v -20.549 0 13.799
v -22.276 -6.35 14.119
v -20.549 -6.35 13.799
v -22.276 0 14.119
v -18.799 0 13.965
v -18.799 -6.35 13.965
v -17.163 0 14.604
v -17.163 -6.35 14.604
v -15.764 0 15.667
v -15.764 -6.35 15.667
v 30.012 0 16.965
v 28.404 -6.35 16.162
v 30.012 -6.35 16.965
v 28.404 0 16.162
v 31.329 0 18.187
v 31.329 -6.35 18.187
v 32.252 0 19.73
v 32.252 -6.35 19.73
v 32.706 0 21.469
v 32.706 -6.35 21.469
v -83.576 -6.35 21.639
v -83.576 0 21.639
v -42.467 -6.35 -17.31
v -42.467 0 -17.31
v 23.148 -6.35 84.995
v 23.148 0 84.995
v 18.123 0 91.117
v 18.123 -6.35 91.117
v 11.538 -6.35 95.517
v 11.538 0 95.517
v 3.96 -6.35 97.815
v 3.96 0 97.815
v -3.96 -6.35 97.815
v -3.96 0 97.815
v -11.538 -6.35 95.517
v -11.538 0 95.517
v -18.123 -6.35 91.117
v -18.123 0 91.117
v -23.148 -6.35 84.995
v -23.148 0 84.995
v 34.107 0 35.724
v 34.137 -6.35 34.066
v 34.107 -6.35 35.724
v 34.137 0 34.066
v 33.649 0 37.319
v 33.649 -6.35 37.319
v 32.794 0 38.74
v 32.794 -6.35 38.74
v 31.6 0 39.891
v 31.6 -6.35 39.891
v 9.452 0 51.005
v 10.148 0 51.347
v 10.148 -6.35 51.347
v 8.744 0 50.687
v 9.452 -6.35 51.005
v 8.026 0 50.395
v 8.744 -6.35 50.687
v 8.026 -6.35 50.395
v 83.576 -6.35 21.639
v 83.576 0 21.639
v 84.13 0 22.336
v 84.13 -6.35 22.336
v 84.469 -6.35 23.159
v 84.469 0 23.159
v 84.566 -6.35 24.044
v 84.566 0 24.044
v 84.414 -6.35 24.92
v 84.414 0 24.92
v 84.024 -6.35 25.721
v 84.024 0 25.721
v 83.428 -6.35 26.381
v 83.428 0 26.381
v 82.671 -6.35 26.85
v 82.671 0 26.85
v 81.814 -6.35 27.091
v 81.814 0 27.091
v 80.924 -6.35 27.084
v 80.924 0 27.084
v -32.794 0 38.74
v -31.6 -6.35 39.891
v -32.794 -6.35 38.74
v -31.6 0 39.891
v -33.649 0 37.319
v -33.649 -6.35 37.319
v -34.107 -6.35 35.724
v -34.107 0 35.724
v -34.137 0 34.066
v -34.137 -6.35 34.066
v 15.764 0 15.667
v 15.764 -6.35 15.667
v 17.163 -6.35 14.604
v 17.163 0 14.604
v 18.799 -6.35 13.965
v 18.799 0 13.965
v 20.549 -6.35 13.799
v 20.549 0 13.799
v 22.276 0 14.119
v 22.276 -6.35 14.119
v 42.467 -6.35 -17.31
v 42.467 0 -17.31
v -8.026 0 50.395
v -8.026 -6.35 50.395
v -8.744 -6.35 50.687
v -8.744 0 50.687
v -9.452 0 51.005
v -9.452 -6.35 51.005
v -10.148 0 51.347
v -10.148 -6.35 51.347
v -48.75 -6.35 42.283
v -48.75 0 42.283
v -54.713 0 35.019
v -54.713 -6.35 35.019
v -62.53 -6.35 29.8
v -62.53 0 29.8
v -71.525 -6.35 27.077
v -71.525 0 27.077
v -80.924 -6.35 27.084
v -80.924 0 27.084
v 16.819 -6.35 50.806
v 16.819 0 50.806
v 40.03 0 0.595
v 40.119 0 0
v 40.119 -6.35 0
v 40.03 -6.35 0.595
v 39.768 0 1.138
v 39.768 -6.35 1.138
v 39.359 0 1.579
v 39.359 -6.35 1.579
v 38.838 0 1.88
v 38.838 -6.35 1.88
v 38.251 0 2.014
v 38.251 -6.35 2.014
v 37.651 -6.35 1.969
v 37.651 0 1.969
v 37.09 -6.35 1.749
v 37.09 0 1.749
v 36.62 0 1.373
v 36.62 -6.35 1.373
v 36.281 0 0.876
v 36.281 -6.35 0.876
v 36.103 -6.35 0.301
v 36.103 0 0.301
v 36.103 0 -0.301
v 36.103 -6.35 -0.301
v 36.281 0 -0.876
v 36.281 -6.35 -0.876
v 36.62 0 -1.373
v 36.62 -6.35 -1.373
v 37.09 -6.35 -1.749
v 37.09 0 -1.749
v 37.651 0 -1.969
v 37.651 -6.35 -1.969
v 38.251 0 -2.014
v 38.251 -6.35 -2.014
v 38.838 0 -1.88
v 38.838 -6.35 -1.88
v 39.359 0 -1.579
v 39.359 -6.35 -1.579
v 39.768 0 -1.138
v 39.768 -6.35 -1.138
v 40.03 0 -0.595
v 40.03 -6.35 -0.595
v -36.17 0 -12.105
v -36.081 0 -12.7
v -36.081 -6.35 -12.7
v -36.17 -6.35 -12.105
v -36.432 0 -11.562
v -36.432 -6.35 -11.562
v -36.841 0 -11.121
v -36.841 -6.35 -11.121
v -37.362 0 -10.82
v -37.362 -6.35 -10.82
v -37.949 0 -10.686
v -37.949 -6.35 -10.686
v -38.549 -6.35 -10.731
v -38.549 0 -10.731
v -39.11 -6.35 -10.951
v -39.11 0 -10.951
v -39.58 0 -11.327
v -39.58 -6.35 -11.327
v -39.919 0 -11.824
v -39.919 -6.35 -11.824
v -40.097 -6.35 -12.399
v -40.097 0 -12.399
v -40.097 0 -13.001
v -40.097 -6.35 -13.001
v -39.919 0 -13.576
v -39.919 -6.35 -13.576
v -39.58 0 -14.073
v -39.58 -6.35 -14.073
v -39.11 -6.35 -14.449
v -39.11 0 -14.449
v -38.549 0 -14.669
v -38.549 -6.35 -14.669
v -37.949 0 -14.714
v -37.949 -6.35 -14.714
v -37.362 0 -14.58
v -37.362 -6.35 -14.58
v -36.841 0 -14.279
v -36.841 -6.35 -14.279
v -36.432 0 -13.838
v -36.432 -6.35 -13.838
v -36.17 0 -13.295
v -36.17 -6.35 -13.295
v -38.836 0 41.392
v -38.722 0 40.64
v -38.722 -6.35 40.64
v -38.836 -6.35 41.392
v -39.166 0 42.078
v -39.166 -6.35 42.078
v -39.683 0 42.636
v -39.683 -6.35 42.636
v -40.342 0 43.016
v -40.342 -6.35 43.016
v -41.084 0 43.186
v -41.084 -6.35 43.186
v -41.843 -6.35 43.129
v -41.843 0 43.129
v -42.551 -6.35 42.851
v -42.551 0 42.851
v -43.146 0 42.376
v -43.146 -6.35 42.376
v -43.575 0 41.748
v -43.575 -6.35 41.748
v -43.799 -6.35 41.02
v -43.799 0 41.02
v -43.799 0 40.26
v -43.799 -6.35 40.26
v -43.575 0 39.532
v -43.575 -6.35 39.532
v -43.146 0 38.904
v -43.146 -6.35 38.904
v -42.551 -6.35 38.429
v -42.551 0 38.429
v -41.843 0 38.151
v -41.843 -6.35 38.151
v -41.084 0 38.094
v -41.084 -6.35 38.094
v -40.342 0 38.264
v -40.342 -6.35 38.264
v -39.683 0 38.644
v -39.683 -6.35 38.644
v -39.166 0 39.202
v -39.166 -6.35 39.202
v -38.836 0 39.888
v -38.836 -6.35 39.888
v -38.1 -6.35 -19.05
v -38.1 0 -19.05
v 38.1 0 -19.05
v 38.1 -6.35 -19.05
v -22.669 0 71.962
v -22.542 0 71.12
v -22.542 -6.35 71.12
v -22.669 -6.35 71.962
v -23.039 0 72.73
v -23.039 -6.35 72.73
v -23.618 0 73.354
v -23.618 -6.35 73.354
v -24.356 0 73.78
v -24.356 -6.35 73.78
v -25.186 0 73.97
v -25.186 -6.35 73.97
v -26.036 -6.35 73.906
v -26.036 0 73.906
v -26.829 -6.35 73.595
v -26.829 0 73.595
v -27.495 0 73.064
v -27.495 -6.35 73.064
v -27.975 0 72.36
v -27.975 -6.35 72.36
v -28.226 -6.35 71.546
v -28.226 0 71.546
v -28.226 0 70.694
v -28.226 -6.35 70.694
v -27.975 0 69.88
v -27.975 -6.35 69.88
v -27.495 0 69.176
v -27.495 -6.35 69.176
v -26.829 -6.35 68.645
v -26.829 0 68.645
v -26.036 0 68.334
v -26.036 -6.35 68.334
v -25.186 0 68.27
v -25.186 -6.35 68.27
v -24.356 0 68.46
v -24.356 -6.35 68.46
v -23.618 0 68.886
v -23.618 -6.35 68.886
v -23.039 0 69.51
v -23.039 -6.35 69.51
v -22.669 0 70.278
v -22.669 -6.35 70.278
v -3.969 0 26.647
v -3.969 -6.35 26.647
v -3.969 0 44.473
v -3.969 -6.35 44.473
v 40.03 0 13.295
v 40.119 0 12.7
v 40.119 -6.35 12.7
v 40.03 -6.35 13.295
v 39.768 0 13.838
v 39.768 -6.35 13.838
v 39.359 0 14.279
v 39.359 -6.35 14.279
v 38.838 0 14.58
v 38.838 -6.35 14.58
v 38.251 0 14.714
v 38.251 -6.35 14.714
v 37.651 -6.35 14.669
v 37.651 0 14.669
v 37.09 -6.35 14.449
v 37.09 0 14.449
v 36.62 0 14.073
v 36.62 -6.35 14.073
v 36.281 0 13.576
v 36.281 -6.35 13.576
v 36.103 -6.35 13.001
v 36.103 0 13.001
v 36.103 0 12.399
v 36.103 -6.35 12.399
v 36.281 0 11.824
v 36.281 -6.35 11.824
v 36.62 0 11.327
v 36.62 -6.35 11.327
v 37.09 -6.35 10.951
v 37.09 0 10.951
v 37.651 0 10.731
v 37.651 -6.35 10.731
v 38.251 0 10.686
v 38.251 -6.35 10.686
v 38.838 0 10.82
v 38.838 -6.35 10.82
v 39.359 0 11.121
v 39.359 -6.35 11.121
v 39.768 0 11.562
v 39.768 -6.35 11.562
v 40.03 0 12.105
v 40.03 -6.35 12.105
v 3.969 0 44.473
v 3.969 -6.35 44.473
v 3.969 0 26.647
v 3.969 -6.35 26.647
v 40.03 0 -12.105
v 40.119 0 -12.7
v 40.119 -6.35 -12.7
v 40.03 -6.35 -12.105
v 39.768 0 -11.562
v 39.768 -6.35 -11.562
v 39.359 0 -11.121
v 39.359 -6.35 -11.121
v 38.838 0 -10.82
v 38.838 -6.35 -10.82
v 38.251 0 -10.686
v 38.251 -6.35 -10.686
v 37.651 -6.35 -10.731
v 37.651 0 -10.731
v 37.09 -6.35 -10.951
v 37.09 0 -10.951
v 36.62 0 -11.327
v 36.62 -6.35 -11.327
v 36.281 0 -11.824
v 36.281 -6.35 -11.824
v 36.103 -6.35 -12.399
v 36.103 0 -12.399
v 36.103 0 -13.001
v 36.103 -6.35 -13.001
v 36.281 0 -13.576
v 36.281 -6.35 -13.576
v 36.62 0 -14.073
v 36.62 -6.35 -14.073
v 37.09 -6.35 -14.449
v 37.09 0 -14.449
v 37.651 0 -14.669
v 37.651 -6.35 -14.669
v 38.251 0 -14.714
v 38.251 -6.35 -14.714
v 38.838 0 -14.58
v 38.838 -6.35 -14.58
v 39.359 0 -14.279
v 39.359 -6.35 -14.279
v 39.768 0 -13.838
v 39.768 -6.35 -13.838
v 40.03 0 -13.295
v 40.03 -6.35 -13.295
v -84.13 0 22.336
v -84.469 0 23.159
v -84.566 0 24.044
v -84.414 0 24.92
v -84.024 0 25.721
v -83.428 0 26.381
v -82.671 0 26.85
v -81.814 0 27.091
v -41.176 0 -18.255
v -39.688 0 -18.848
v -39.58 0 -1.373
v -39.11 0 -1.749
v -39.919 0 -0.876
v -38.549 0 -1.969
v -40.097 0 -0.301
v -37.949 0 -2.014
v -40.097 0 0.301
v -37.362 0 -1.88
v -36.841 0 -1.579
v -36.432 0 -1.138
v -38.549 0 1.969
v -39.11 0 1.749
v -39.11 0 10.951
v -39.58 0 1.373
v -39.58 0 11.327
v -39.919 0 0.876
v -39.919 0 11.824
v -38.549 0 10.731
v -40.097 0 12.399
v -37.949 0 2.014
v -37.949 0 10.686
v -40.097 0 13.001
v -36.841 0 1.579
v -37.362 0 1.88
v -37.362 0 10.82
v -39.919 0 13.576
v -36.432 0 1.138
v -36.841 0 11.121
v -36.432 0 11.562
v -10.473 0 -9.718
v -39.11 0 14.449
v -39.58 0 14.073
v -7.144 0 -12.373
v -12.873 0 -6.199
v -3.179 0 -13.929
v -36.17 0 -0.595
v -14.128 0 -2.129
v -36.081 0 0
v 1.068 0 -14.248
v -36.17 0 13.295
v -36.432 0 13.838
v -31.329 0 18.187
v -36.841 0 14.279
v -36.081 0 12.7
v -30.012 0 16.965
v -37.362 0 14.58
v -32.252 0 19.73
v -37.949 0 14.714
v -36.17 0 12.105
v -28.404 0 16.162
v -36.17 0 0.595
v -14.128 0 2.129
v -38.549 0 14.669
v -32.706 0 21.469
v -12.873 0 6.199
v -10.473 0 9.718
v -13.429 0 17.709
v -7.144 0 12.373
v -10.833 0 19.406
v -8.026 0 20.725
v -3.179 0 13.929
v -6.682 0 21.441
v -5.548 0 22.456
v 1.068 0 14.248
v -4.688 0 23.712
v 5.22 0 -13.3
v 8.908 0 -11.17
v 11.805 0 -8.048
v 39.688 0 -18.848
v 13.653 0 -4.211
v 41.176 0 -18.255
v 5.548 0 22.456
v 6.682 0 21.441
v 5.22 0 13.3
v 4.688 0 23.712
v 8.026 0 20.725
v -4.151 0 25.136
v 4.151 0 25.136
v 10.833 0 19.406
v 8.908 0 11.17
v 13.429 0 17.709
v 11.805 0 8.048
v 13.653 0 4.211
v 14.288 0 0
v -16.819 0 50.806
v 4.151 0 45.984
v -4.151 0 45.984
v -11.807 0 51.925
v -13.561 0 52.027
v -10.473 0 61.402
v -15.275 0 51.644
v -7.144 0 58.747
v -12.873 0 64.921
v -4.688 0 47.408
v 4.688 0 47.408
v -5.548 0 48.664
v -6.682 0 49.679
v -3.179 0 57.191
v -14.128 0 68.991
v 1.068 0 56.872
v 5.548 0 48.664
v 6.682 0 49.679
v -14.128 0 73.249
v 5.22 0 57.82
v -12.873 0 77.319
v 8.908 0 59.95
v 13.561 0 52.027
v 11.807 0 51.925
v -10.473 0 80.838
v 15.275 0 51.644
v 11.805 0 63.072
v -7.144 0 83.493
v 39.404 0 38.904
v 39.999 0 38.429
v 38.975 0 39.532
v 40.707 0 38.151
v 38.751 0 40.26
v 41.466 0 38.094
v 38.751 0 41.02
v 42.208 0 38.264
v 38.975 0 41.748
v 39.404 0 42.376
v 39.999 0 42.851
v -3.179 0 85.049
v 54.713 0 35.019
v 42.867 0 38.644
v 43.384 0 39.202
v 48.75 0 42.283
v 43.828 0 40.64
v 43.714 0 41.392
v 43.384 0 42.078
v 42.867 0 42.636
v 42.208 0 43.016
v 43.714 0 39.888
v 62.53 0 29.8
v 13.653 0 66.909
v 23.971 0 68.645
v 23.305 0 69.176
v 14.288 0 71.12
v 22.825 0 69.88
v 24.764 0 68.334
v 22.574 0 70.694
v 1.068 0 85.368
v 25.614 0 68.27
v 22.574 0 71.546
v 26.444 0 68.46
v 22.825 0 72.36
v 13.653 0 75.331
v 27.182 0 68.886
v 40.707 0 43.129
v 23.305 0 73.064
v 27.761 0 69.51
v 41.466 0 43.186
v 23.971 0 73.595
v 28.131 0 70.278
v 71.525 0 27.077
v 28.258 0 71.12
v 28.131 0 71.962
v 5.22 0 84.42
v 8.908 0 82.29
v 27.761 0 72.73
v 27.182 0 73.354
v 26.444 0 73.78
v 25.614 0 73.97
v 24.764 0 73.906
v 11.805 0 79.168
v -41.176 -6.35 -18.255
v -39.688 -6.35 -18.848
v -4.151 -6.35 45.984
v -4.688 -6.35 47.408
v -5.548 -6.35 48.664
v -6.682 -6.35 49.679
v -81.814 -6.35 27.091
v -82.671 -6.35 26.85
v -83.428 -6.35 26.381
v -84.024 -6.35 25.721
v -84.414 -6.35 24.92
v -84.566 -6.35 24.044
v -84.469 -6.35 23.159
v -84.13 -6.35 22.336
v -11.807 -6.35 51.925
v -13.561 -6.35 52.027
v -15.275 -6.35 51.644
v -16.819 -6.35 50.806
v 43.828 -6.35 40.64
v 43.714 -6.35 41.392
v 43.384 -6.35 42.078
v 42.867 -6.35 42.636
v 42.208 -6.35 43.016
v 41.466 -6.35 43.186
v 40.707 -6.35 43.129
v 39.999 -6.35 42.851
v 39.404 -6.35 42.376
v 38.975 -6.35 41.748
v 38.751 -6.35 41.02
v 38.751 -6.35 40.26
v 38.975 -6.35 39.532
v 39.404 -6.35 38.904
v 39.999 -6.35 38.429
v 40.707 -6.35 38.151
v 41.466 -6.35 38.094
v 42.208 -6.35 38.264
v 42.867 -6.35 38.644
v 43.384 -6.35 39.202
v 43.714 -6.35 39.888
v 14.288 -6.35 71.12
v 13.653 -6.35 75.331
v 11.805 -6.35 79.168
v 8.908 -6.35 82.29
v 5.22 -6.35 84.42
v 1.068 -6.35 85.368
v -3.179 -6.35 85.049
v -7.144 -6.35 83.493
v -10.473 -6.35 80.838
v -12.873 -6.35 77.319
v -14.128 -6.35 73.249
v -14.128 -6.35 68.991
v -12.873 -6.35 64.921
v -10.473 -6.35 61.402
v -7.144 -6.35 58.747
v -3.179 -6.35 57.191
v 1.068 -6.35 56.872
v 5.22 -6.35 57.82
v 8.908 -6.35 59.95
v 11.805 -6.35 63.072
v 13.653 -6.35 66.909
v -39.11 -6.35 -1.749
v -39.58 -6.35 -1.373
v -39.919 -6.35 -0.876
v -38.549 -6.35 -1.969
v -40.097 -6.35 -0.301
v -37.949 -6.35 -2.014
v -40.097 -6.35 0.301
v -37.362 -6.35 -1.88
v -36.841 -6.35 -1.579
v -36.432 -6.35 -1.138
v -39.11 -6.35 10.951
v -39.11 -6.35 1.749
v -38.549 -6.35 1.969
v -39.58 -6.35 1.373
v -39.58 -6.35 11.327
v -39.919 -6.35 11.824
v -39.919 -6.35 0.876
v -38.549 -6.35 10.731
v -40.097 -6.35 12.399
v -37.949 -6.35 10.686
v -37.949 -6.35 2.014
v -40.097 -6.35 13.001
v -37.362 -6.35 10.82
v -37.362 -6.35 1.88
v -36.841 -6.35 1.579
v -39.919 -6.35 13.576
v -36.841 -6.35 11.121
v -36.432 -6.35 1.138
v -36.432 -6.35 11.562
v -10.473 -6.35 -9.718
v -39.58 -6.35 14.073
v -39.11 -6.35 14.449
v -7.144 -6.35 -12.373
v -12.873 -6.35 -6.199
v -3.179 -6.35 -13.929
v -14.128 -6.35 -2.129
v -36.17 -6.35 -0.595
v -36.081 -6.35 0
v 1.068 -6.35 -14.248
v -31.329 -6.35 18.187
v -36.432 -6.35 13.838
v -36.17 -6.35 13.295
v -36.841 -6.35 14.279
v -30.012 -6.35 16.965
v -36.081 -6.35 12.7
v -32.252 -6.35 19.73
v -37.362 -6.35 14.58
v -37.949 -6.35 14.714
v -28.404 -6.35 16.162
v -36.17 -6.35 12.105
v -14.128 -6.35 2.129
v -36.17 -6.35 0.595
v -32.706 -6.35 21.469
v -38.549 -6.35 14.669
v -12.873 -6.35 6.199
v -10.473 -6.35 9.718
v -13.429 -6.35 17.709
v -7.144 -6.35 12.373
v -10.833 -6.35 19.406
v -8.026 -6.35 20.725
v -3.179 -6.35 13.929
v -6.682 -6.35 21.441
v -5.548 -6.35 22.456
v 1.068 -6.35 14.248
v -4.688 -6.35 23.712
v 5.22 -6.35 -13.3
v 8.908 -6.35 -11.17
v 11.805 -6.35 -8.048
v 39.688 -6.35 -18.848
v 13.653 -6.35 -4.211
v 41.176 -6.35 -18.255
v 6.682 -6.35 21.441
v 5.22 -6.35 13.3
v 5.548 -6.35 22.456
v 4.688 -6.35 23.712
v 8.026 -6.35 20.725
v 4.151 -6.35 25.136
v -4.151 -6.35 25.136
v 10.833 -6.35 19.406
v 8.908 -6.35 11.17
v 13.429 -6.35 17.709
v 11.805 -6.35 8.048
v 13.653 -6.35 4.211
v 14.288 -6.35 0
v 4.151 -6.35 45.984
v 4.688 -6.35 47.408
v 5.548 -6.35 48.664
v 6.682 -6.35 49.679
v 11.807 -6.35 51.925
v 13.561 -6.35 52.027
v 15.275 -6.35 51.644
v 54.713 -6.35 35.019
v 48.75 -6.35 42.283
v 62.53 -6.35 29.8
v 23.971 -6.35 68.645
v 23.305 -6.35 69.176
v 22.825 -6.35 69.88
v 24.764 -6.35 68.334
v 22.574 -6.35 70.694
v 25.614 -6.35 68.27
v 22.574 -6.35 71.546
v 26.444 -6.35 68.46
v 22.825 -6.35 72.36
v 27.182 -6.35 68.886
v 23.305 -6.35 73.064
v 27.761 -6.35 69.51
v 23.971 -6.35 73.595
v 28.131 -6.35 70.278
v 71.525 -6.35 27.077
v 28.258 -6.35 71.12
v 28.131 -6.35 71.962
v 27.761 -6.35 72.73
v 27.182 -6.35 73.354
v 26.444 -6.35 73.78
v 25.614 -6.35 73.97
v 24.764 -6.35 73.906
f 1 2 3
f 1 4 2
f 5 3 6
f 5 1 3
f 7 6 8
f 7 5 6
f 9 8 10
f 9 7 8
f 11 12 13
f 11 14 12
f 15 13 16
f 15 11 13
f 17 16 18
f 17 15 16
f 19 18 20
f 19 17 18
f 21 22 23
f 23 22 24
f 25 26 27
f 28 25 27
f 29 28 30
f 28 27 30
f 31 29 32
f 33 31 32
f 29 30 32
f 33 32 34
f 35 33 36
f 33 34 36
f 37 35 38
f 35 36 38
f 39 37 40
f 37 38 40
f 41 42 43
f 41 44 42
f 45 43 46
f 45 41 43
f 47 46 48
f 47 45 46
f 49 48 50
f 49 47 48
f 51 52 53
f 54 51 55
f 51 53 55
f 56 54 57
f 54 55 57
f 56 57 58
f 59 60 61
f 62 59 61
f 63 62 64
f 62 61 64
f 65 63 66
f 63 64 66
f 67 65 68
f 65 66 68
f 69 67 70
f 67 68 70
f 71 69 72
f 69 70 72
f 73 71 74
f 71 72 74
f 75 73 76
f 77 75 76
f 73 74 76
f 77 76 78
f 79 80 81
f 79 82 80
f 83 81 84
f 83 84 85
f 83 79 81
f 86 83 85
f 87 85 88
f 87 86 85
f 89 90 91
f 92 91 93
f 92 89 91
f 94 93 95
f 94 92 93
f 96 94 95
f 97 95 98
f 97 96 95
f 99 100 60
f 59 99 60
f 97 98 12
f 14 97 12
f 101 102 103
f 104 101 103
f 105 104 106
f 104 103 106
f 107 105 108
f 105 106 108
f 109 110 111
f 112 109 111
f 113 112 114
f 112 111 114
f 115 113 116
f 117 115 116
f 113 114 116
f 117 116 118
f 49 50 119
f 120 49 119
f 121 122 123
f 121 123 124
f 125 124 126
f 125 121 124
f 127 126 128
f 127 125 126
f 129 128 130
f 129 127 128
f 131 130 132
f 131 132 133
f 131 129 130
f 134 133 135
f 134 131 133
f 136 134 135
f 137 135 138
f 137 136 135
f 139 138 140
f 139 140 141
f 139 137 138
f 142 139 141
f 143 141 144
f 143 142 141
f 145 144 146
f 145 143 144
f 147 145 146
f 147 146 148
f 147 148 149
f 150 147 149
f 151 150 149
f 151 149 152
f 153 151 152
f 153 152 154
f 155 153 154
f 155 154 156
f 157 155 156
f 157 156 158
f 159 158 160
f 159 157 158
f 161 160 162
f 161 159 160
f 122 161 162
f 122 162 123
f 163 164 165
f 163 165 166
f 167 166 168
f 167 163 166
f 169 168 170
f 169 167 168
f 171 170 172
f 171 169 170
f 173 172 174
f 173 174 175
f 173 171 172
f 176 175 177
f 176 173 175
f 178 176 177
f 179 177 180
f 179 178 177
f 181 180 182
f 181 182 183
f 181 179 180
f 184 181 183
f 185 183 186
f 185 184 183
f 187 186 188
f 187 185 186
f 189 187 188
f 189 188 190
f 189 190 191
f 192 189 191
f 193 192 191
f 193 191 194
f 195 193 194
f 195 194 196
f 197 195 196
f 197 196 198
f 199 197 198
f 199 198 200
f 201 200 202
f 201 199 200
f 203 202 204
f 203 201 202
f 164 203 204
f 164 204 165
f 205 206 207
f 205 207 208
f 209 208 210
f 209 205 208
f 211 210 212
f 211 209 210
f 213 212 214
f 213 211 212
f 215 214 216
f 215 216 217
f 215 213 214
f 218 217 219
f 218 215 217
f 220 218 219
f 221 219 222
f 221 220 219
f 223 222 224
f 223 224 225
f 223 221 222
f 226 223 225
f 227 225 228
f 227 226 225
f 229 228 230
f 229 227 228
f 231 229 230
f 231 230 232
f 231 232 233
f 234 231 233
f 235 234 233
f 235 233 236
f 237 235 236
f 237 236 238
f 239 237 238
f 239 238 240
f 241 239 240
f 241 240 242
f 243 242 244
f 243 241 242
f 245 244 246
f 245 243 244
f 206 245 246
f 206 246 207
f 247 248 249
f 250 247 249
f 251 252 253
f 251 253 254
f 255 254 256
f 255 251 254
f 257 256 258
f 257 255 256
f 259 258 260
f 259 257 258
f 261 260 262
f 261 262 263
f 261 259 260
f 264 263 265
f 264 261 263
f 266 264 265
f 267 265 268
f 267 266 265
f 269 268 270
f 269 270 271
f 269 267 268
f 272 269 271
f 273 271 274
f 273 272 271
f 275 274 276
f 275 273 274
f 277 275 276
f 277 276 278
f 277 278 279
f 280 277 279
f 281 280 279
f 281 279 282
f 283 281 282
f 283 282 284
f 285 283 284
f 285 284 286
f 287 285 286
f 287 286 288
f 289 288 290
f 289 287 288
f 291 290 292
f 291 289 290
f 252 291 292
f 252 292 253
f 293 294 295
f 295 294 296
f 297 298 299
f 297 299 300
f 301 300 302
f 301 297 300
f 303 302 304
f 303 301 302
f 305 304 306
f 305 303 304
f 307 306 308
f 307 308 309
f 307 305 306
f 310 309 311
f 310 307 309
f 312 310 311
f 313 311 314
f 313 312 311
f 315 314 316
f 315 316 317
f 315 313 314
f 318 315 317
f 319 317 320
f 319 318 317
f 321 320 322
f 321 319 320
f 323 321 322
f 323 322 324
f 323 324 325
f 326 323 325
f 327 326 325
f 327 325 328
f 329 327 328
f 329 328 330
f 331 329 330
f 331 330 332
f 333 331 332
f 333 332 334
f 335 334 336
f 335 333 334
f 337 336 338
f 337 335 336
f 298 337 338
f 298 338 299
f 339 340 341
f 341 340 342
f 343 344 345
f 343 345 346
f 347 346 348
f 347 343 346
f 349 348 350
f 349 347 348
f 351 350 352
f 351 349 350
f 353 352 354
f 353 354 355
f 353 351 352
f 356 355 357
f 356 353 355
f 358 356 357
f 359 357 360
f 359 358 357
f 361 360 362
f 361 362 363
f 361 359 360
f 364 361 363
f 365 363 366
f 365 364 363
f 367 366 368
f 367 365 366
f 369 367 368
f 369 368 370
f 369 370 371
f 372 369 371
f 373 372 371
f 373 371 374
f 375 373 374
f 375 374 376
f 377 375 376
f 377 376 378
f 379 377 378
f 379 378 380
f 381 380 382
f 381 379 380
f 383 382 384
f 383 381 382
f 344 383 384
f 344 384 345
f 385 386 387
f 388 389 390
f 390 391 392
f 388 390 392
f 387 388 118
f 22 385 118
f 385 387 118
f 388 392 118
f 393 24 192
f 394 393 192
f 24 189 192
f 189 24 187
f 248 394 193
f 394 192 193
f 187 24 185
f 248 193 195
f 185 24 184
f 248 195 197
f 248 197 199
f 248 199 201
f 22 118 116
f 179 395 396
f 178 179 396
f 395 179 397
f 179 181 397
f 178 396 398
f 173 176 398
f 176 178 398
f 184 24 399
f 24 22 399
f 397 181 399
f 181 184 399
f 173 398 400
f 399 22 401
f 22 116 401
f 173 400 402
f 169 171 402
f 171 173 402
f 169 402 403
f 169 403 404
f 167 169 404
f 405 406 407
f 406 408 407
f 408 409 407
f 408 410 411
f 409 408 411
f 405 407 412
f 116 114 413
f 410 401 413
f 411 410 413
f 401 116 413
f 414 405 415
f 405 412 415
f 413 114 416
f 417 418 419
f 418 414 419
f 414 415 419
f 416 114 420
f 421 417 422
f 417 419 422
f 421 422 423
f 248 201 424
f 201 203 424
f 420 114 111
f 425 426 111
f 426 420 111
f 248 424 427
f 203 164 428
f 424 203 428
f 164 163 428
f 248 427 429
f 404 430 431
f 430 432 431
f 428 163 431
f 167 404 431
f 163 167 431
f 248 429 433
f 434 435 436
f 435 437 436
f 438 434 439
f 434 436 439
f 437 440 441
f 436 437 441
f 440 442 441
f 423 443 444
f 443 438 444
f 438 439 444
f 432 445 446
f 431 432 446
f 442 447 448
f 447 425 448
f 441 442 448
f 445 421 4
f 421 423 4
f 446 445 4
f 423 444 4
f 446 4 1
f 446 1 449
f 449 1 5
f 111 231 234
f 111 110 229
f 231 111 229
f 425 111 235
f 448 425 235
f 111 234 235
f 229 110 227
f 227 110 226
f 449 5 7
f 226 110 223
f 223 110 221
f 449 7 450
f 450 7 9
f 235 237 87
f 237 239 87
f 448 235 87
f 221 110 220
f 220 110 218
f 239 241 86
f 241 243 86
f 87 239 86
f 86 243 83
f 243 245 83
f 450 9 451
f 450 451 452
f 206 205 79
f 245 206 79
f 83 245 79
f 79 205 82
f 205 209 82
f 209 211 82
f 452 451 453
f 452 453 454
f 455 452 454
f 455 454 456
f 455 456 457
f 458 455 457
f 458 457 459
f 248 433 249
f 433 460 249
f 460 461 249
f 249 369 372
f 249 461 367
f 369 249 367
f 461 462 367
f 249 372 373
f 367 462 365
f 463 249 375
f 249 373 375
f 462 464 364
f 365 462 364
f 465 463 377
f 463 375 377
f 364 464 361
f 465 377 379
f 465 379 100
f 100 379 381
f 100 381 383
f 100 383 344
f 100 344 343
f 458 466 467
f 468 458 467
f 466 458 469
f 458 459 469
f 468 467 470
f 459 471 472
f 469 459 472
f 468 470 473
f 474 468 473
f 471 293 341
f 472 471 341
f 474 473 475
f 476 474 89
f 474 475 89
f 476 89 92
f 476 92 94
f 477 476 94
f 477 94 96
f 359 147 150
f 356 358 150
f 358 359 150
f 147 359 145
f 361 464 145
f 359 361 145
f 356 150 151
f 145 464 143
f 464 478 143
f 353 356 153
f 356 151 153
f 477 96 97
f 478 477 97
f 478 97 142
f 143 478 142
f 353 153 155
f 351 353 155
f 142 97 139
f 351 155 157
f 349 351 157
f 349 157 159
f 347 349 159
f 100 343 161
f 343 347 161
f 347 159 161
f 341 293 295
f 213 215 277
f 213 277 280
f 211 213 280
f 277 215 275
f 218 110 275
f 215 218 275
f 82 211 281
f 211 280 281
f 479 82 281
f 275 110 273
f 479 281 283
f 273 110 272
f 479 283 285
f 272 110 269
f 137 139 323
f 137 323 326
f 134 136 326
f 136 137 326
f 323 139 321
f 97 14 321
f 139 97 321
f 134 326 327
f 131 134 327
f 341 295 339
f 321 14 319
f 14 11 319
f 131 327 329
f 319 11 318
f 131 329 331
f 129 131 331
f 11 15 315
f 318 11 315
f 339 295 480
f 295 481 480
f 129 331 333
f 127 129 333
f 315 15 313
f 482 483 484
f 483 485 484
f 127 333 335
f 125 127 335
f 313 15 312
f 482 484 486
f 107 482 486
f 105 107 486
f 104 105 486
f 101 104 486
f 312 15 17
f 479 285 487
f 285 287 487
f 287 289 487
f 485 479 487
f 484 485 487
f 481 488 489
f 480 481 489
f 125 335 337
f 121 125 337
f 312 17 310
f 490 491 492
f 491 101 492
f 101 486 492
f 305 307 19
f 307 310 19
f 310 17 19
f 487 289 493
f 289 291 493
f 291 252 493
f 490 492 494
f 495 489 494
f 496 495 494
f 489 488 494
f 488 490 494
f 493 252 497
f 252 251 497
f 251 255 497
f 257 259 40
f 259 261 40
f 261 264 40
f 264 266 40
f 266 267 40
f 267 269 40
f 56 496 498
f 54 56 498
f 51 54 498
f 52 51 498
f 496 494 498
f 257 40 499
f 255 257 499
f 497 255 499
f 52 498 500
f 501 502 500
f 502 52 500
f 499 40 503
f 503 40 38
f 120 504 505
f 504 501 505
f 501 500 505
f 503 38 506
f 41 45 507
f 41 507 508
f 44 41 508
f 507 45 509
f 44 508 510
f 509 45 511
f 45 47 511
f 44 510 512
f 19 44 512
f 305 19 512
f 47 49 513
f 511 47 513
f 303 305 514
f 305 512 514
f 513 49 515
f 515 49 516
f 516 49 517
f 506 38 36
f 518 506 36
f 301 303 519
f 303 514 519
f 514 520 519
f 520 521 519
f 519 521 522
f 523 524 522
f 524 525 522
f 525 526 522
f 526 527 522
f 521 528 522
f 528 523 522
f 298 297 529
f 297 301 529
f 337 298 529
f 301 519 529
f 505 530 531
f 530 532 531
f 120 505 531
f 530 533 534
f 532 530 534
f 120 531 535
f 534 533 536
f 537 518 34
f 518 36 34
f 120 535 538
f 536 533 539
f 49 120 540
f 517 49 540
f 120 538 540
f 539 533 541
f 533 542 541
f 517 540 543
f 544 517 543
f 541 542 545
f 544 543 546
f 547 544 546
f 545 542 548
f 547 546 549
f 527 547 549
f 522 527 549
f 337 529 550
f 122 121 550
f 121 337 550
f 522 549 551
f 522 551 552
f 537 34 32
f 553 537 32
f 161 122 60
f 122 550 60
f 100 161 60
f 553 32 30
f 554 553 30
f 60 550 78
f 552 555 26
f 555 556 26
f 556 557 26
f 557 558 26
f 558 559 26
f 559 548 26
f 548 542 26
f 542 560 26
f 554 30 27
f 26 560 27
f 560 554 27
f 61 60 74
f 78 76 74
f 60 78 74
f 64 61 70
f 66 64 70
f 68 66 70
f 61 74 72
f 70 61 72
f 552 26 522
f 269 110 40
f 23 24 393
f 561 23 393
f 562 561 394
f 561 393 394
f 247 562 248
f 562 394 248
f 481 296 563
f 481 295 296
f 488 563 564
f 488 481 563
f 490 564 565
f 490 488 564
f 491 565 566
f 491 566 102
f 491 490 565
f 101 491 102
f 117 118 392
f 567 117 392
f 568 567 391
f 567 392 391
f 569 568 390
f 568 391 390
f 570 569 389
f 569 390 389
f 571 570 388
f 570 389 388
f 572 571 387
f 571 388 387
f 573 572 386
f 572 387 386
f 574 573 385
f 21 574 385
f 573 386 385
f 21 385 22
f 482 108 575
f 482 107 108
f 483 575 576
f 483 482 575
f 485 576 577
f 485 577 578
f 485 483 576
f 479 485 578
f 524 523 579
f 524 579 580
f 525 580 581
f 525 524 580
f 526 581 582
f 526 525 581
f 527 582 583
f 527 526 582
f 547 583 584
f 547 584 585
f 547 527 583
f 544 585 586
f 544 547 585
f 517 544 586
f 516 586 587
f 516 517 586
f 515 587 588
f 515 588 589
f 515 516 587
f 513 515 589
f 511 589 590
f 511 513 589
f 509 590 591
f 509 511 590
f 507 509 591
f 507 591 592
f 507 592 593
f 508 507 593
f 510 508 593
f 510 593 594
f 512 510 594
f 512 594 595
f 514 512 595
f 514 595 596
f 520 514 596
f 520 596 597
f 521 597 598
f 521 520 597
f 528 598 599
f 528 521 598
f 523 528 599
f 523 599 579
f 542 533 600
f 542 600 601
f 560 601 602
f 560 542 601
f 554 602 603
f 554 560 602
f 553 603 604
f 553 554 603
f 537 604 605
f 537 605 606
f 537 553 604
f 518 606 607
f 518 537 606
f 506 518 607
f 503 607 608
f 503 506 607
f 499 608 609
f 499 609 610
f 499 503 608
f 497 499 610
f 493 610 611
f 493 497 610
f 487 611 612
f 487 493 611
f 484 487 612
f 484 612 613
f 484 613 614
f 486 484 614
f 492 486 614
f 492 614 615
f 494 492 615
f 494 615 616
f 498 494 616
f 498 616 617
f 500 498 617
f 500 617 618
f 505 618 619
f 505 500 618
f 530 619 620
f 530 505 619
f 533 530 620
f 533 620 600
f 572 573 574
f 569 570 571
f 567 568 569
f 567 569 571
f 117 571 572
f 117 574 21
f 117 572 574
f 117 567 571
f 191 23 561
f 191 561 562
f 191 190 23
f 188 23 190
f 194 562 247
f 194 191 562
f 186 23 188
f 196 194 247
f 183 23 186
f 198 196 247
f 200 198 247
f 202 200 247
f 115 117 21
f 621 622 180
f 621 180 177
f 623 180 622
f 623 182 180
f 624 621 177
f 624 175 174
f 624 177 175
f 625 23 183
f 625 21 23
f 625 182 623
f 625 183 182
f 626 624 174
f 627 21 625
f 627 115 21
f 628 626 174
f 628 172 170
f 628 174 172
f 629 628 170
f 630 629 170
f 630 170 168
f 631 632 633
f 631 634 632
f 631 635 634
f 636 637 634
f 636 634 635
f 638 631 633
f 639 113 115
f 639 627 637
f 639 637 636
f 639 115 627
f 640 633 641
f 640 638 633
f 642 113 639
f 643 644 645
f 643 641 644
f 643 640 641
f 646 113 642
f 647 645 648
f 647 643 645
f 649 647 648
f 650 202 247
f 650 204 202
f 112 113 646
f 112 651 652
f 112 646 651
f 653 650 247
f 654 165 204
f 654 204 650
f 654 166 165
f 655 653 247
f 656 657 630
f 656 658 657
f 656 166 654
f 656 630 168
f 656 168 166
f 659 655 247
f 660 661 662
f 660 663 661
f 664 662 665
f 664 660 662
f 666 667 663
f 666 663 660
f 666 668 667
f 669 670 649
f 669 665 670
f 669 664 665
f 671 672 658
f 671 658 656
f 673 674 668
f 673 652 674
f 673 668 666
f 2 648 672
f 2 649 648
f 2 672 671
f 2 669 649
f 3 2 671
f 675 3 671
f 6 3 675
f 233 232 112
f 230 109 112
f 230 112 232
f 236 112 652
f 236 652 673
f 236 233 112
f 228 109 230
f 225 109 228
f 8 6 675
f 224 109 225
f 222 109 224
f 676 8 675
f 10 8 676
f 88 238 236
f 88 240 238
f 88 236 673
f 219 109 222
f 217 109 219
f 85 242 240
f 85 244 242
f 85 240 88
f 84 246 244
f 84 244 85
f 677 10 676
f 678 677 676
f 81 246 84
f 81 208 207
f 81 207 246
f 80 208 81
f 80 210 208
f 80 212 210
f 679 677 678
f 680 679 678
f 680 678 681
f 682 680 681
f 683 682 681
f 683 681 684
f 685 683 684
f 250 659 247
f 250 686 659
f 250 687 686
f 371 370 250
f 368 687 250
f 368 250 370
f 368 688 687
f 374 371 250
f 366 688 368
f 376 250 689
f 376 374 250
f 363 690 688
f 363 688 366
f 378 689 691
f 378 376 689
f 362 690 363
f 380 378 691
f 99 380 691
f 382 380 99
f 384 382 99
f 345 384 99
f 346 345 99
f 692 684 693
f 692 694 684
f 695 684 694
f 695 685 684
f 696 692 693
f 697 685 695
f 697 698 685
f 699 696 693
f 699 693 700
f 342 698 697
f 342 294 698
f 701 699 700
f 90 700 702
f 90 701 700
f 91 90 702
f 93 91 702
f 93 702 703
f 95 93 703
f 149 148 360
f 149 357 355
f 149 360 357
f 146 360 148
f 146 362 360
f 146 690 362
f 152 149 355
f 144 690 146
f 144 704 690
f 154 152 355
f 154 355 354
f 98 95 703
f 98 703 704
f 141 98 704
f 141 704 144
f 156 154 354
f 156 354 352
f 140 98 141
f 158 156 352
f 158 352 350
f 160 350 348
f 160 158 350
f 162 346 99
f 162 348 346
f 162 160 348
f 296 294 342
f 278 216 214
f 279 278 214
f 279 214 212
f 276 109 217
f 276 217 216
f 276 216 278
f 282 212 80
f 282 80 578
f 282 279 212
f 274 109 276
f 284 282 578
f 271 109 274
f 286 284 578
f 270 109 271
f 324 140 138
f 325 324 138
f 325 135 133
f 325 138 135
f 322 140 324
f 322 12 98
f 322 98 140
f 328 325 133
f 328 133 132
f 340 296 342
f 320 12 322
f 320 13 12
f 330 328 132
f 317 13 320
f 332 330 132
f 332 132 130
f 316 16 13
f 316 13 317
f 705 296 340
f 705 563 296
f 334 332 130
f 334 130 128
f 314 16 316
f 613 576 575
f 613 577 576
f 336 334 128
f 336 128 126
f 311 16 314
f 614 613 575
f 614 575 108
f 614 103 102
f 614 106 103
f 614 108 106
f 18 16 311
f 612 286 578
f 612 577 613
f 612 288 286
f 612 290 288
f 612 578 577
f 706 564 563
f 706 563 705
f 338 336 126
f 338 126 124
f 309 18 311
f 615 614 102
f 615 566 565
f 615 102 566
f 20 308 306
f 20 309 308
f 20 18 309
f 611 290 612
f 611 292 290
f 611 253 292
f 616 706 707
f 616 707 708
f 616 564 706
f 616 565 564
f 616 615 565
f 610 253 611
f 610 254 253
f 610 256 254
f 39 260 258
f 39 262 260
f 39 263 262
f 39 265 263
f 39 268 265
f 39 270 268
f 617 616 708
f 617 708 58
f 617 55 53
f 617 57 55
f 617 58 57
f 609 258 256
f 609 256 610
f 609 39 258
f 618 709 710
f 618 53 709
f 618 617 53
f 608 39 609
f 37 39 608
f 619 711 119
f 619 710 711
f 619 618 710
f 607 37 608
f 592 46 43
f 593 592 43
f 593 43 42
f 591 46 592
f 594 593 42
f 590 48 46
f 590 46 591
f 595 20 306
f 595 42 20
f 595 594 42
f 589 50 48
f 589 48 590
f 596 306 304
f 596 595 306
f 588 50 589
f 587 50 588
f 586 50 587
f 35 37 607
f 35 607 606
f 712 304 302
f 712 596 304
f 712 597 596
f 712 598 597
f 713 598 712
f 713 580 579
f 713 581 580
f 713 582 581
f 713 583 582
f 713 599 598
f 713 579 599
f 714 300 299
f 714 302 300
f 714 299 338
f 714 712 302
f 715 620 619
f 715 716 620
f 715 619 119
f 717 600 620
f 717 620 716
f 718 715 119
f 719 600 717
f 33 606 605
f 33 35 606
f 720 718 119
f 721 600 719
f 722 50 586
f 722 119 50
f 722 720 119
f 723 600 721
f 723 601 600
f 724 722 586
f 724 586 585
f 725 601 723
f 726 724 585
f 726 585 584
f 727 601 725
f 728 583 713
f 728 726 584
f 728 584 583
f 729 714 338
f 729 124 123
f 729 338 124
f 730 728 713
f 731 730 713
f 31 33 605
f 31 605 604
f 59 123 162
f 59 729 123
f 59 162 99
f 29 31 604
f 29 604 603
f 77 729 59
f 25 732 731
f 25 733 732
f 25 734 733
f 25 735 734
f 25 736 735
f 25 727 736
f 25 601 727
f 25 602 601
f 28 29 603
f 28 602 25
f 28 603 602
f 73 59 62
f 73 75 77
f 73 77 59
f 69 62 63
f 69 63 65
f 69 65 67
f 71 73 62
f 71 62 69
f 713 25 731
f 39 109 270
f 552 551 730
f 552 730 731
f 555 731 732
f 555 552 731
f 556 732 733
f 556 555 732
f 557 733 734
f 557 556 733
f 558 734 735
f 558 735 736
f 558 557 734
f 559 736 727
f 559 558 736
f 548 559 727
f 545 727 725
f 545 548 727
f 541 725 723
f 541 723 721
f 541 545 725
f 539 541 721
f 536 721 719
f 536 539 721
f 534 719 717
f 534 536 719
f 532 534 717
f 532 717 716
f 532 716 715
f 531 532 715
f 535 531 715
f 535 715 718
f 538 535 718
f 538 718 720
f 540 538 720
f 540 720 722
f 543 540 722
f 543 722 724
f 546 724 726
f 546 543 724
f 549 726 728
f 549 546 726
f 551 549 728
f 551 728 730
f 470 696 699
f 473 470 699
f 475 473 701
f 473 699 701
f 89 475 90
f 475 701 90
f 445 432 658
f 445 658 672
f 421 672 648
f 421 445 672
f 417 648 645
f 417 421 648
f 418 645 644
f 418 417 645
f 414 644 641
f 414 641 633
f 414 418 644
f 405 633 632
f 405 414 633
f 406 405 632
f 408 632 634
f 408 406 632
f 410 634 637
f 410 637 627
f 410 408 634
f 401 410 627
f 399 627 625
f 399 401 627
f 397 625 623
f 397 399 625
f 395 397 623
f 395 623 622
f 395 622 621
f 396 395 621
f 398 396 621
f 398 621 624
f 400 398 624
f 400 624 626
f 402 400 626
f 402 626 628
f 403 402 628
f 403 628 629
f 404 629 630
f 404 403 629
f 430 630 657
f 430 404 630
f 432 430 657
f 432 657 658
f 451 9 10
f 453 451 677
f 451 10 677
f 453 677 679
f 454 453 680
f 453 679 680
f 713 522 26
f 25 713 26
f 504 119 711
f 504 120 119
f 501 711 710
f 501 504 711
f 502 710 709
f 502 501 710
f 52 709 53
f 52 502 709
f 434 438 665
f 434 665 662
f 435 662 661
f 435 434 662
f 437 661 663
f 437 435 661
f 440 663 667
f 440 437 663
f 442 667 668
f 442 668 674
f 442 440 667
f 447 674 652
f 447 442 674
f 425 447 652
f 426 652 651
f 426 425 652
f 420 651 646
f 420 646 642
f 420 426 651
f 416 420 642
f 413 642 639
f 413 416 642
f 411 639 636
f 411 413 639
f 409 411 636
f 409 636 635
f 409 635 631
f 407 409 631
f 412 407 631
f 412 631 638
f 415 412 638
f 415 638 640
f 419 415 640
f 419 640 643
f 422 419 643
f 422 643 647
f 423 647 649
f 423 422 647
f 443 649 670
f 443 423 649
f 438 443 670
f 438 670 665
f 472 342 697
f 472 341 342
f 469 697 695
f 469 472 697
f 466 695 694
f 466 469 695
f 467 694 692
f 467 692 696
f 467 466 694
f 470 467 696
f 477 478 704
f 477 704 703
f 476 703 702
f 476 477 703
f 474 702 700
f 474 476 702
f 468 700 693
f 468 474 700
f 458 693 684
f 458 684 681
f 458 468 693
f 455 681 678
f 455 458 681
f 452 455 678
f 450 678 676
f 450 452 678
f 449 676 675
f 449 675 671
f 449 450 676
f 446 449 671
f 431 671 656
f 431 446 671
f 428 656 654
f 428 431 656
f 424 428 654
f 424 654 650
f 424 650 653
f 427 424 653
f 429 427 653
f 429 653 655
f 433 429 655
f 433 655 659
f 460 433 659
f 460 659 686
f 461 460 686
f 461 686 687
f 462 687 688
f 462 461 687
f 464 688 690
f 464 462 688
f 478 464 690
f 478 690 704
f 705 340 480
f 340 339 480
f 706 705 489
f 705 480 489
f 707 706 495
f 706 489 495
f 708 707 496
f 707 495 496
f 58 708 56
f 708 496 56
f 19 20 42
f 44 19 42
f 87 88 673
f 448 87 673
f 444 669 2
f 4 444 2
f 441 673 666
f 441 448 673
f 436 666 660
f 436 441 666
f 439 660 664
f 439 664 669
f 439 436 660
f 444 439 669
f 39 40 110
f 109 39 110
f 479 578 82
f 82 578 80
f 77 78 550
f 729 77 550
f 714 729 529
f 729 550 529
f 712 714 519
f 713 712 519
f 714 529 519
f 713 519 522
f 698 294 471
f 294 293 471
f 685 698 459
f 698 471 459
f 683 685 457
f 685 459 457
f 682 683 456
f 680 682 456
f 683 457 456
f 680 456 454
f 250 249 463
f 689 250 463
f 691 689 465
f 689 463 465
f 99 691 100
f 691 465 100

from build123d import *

# Parameters (mm, degrees)
F0_R     = 2.0193
F0_R_2   = 14.2875
F0_R_3   = 2.5527
F0_R_4   = 2.8575
F1_DEPTH = 6.35
F3_DEPTH = 6.351
F4_R     = 6.35


with BuildPart() as f1:
    # F0 (on Front) → F1 (new body)
    with BuildSketch(Plane.XZ):
        with BuildLine():
            ThreePointArc((-48.749763, 42.283305), (-62.529838, 29.799935), (-80.924107, 27.084083))
            ThreePointArc((-80.924107, 27.084083), (-84.247136, 25.334263), (-83.576453, 21.639053))
            Line((-83.576453, 21.639053), (-42.467369, -17.309619))
            ThreePointArc((-42.467369, -17.309619), (-40.450683, -18.59888), (-38.1, -19.05))
            Line((-38.1, -19.05), (38.1, -19.05))
            ThreePointArc((38.1, -19.05), (40.450683, -18.59888), (42.467369, -17.309619))
            Line((42.467369, -17.309619), (83.576453, 21.639053))
            ThreePointArc((83.576453, 21.639053), (84.247136, 25.334263), (80.924107, 27.084083))
            ThreePointArc((80.924107, 27.084083), (62.529838, 29.799935), (48.749763, 42.283305))
            Line((48.749763, 42.283305), (23.147521, 84.995065))
            ThreePointArc((23.147521, 84.995065), (0, 98.1075), (-23.147521, 84.995065))
            Line((-23.147521, 84.995065), (-48.749763, 42.283305))
        make_face()
        with Locations((-38.1, -12.7)):
            Circle(F0_R, mode=Mode.SUBTRACT)
        with Locations((-38.1, 0)):
            Circle(F0_R, mode=Mode.SUBTRACT)
        Circle(F0_R_2, mode=Mode.SUBTRACT)
        with Locations((-38.1, 12.7)):
            Circle(F0_R, mode=Mode.SUBTRACT)
        with Locations((38.1, -12.7)):
            Circle(F0_R, mode=Mode.SUBTRACT)
        with Locations((38.1, 0)):
            Circle(F0_R, mode=Mode.SUBTRACT)
        with Locations((38.1, 12.7)):
            Circle(F0_R, mode=Mode.SUBTRACT)
        with Locations((-41.275, 40.64)):
            Circle(F0_R_3, mode=Mode.SUBTRACT)
        with Locations((-25.4, 71.12)):
            Circle(F0_R_4, mode=Mode.SUBTRACT)
        with Locations((0, 71.12)):
            Circle(F0_R_2, mode=Mode.SUBTRACT)
        with Locations((41.275, 40.64)):
            Circle(F0_R_3, mode=Mode.SUBTRACT)
        with Locations((25.4, 71.12)):
            Circle(F0_R_4, mode=Mode.SUBTRACT)
    extrude(amount=F1_DEPTH)

    # F2 (on face) → F3 (cut, through all)
    with BuildSketch(Plane.XZ.offset(6.35)):
        with BuildLine():
            Line((3.96875, 49.252224), (3.96875, 21.867776))
            ThreePointArc((3.96875, 21.867776), (11.982359, 18.718272), (18.19753, 12.759331))
            Line((18.19753, 12.759331), (32.248092, 17.442852))
            Line((32.248092, 17.442852), (34.551338, 37.71141))
            Line((34.551338, 37.71141), (13.361087, 53.359595))
            ThreePointArc((13.361087, 53.359595), (8.904967, 50.75699), (3.96875, 49.252224))
        make_face()
        with BuildLine():
            ThreePointArc((-18.19753, 12.759331), (-11.982359, 18.718272), (-3.96875, 21.867776))
            Line((-3.96875, 21.867776), (-3.96875, 49.252224))
            ThreePointArc((-3.96875, 49.252224), (-8.904967, 50.75699), (-13.361087, 53.359595))
            Line((-13.361087, 53.359595), (-34.551338, 37.71141))
            Line((-34.551338, 37.71141), (-32.248092, 17.442852))
            Line((-32.248092, 17.442852), (-18.19753, 12.759331))
        make_face()
    extrude(amount=-F3_DEPTH, mode=Mode.SUBTRACT)

    # F4
    f4_edges = [f1.edges().sort_by_distance(p)[0] for p in [
        (-13.361087, -3.175, 53.359595),
        (-3.96875, -3.175, 49.252224),
        (-3.96875, -3.175, 21.867776),
        (-18.19753, -3.175, 12.759331),
        (-32.248092, -3.175, 17.442852),
        (-34.551338, -3.175, 37.71141),
        (3.96875, -3.175, 49.252224),
        (13.361087, -3.175, 53.359595),
        (34.551338, -3.175, 37.71141),
        (32.248092, -3.175, 17.442852),
        (18.19753, -3.175, 12.759331),
        (3.96875, -3.175, 21.867776),
    ]]
    fillet(f4_edges, radius=F4_R)


solid = f1.part
